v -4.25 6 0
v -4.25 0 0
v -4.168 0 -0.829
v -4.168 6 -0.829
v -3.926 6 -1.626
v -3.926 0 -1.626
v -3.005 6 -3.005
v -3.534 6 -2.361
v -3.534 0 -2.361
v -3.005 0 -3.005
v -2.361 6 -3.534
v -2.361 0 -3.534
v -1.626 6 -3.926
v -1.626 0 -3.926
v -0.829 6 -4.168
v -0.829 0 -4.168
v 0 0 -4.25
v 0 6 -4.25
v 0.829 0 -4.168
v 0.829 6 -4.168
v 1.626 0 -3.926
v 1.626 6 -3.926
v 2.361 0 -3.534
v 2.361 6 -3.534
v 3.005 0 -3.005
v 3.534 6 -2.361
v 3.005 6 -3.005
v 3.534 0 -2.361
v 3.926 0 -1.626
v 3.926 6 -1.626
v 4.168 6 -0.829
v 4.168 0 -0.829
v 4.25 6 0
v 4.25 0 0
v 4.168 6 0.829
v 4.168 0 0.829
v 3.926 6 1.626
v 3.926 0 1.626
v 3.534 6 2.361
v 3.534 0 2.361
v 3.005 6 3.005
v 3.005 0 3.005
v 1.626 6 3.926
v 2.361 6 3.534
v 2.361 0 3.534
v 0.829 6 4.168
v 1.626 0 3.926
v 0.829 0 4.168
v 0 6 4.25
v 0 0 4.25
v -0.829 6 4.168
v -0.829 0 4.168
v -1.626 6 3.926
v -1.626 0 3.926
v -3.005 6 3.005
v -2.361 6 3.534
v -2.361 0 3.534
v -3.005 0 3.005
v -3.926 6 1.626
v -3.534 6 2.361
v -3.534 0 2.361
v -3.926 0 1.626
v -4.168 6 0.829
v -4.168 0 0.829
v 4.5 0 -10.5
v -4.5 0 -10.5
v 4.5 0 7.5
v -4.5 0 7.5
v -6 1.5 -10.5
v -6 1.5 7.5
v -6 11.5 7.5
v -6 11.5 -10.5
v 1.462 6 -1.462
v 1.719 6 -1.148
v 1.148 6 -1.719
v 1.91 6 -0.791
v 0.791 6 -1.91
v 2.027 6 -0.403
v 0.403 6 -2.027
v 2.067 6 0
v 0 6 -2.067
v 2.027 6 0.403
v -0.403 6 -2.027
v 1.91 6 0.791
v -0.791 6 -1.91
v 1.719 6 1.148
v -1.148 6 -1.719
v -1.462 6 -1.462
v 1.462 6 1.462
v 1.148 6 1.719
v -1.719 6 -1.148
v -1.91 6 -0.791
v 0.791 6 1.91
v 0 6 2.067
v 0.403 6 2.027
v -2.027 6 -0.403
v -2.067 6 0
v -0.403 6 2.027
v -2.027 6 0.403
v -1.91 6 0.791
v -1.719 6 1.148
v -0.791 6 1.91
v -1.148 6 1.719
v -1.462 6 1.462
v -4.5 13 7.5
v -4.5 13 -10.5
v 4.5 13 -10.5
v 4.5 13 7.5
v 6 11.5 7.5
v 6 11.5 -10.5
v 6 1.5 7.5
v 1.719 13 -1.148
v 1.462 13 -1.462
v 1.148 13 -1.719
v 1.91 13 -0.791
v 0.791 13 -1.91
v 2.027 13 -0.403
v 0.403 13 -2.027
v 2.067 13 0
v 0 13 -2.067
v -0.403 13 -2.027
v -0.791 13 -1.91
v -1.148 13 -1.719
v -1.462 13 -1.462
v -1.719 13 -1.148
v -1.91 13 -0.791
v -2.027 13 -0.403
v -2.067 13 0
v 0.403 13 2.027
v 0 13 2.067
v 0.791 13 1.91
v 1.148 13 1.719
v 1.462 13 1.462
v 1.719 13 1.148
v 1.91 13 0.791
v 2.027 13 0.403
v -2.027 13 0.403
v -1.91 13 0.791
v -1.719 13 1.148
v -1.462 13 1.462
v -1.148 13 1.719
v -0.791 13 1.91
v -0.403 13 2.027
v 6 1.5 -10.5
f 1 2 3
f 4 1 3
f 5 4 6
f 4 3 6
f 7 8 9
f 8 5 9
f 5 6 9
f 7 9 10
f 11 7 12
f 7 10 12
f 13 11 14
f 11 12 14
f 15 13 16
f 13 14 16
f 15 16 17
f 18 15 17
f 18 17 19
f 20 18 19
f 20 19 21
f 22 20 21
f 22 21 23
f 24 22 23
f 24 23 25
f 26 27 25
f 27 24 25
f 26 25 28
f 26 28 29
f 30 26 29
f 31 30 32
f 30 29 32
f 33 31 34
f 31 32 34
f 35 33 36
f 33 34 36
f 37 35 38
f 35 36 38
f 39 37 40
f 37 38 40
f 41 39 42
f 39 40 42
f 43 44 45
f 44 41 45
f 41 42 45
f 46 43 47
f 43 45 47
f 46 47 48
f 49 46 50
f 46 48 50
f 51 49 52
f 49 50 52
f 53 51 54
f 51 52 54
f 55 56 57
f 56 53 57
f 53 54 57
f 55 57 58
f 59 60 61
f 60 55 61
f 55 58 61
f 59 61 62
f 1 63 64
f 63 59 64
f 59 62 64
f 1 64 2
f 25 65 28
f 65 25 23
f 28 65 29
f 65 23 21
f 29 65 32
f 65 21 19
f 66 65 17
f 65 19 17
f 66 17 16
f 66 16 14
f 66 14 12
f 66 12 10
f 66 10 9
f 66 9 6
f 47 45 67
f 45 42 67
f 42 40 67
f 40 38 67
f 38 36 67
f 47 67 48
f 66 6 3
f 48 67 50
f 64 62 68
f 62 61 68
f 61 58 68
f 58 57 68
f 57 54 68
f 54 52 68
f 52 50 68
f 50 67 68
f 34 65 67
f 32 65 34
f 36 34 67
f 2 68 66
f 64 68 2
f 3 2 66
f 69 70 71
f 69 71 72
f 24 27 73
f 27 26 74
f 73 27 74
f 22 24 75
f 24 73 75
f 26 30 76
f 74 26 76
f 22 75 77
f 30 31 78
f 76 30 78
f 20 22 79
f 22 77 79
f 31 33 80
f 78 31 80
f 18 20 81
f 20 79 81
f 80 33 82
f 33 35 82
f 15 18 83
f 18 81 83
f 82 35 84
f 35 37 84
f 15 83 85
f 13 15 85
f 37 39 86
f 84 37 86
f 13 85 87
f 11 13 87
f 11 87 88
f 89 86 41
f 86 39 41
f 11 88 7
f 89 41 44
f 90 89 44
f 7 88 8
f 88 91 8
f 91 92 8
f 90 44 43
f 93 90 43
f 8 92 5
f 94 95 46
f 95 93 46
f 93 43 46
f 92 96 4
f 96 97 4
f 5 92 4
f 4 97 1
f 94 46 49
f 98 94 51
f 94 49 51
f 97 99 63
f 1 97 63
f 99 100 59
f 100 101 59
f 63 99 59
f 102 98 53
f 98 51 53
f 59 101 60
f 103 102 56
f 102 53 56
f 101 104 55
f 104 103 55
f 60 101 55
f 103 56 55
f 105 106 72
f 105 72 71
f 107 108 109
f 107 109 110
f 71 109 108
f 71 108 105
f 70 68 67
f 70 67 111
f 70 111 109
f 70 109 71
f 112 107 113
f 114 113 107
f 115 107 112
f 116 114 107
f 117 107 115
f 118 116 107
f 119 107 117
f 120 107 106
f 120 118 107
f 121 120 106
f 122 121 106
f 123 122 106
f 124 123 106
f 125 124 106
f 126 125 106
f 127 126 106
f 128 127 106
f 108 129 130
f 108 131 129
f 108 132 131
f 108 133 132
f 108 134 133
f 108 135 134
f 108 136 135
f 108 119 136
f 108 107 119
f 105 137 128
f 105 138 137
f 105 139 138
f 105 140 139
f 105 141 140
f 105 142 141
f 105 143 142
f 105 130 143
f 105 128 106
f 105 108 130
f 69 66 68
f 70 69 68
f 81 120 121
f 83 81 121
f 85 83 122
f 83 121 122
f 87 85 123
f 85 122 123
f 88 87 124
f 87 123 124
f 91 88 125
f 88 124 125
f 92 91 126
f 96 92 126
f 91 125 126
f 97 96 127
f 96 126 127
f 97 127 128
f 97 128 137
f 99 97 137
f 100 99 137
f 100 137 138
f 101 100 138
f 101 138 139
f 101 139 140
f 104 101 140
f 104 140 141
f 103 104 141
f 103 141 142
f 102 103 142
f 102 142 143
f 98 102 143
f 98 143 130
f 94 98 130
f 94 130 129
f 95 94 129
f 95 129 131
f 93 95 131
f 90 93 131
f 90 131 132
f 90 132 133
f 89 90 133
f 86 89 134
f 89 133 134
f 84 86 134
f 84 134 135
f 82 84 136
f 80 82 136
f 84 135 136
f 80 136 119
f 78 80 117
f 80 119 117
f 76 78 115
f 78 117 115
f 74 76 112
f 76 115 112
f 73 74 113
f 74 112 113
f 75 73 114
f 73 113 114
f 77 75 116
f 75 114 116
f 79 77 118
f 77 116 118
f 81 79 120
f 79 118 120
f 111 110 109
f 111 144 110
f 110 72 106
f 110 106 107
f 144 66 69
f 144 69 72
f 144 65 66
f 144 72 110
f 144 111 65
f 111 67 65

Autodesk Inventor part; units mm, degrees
ref_plane "YZ Plane" through (0, 0, 0) normal (1, 0, 0) x (0, 1, 0)
ref_plane "XZ Plane" through (0, 0, 0) normal (0, 1, 0) x (-1, 0, 0)
ref_plane "XY Plane" through (0, 0, 0) normal (0, 0, 1) x (1, 0, 0)
sketch "Sketch1" plane through (0, 0, 0) normal (0, 1, 0) x (-1, 0, 0)
  line L0 (-6, 7.5) -> (6, 7.5)
  line L1 (6, 7.5) -> (6, -10.5)
  line L2 (6, -10.5) -> (-6, -10.5)
  line L3 (-6, -10.5) -> (-6, 7.5)
  circle A0 centre (0, 0) radius 4.25
  point P0 (0, 7.5)
  dimension "d0" = 12
  dimension "d1" = 18
  dimension "d2" = 8.5
  dimension "d3" = 7.5
extrude "Extrusion1" add sketch "Sketch1" along normal blind 13 contours L0 L1 L2 L3 | A0
extrude "Extrusion2" cut sketch "Sketch1" along normal blind 6 contours A0
chamfer "Chamfer2" distance 1.5 angle 45 4 edges at (6, 13, -1.5) (-6, 13, -1.5) (-6, 0, -1.5) (6, 0, -1.5)
hole "Hole3" at (0, 0, 0) direction (0, 1, 0) diameter 4.134 depth 13 thread size "M5x0.8" class "6H" standard "ISO Metric profile"
properties part number "ConTruot"
